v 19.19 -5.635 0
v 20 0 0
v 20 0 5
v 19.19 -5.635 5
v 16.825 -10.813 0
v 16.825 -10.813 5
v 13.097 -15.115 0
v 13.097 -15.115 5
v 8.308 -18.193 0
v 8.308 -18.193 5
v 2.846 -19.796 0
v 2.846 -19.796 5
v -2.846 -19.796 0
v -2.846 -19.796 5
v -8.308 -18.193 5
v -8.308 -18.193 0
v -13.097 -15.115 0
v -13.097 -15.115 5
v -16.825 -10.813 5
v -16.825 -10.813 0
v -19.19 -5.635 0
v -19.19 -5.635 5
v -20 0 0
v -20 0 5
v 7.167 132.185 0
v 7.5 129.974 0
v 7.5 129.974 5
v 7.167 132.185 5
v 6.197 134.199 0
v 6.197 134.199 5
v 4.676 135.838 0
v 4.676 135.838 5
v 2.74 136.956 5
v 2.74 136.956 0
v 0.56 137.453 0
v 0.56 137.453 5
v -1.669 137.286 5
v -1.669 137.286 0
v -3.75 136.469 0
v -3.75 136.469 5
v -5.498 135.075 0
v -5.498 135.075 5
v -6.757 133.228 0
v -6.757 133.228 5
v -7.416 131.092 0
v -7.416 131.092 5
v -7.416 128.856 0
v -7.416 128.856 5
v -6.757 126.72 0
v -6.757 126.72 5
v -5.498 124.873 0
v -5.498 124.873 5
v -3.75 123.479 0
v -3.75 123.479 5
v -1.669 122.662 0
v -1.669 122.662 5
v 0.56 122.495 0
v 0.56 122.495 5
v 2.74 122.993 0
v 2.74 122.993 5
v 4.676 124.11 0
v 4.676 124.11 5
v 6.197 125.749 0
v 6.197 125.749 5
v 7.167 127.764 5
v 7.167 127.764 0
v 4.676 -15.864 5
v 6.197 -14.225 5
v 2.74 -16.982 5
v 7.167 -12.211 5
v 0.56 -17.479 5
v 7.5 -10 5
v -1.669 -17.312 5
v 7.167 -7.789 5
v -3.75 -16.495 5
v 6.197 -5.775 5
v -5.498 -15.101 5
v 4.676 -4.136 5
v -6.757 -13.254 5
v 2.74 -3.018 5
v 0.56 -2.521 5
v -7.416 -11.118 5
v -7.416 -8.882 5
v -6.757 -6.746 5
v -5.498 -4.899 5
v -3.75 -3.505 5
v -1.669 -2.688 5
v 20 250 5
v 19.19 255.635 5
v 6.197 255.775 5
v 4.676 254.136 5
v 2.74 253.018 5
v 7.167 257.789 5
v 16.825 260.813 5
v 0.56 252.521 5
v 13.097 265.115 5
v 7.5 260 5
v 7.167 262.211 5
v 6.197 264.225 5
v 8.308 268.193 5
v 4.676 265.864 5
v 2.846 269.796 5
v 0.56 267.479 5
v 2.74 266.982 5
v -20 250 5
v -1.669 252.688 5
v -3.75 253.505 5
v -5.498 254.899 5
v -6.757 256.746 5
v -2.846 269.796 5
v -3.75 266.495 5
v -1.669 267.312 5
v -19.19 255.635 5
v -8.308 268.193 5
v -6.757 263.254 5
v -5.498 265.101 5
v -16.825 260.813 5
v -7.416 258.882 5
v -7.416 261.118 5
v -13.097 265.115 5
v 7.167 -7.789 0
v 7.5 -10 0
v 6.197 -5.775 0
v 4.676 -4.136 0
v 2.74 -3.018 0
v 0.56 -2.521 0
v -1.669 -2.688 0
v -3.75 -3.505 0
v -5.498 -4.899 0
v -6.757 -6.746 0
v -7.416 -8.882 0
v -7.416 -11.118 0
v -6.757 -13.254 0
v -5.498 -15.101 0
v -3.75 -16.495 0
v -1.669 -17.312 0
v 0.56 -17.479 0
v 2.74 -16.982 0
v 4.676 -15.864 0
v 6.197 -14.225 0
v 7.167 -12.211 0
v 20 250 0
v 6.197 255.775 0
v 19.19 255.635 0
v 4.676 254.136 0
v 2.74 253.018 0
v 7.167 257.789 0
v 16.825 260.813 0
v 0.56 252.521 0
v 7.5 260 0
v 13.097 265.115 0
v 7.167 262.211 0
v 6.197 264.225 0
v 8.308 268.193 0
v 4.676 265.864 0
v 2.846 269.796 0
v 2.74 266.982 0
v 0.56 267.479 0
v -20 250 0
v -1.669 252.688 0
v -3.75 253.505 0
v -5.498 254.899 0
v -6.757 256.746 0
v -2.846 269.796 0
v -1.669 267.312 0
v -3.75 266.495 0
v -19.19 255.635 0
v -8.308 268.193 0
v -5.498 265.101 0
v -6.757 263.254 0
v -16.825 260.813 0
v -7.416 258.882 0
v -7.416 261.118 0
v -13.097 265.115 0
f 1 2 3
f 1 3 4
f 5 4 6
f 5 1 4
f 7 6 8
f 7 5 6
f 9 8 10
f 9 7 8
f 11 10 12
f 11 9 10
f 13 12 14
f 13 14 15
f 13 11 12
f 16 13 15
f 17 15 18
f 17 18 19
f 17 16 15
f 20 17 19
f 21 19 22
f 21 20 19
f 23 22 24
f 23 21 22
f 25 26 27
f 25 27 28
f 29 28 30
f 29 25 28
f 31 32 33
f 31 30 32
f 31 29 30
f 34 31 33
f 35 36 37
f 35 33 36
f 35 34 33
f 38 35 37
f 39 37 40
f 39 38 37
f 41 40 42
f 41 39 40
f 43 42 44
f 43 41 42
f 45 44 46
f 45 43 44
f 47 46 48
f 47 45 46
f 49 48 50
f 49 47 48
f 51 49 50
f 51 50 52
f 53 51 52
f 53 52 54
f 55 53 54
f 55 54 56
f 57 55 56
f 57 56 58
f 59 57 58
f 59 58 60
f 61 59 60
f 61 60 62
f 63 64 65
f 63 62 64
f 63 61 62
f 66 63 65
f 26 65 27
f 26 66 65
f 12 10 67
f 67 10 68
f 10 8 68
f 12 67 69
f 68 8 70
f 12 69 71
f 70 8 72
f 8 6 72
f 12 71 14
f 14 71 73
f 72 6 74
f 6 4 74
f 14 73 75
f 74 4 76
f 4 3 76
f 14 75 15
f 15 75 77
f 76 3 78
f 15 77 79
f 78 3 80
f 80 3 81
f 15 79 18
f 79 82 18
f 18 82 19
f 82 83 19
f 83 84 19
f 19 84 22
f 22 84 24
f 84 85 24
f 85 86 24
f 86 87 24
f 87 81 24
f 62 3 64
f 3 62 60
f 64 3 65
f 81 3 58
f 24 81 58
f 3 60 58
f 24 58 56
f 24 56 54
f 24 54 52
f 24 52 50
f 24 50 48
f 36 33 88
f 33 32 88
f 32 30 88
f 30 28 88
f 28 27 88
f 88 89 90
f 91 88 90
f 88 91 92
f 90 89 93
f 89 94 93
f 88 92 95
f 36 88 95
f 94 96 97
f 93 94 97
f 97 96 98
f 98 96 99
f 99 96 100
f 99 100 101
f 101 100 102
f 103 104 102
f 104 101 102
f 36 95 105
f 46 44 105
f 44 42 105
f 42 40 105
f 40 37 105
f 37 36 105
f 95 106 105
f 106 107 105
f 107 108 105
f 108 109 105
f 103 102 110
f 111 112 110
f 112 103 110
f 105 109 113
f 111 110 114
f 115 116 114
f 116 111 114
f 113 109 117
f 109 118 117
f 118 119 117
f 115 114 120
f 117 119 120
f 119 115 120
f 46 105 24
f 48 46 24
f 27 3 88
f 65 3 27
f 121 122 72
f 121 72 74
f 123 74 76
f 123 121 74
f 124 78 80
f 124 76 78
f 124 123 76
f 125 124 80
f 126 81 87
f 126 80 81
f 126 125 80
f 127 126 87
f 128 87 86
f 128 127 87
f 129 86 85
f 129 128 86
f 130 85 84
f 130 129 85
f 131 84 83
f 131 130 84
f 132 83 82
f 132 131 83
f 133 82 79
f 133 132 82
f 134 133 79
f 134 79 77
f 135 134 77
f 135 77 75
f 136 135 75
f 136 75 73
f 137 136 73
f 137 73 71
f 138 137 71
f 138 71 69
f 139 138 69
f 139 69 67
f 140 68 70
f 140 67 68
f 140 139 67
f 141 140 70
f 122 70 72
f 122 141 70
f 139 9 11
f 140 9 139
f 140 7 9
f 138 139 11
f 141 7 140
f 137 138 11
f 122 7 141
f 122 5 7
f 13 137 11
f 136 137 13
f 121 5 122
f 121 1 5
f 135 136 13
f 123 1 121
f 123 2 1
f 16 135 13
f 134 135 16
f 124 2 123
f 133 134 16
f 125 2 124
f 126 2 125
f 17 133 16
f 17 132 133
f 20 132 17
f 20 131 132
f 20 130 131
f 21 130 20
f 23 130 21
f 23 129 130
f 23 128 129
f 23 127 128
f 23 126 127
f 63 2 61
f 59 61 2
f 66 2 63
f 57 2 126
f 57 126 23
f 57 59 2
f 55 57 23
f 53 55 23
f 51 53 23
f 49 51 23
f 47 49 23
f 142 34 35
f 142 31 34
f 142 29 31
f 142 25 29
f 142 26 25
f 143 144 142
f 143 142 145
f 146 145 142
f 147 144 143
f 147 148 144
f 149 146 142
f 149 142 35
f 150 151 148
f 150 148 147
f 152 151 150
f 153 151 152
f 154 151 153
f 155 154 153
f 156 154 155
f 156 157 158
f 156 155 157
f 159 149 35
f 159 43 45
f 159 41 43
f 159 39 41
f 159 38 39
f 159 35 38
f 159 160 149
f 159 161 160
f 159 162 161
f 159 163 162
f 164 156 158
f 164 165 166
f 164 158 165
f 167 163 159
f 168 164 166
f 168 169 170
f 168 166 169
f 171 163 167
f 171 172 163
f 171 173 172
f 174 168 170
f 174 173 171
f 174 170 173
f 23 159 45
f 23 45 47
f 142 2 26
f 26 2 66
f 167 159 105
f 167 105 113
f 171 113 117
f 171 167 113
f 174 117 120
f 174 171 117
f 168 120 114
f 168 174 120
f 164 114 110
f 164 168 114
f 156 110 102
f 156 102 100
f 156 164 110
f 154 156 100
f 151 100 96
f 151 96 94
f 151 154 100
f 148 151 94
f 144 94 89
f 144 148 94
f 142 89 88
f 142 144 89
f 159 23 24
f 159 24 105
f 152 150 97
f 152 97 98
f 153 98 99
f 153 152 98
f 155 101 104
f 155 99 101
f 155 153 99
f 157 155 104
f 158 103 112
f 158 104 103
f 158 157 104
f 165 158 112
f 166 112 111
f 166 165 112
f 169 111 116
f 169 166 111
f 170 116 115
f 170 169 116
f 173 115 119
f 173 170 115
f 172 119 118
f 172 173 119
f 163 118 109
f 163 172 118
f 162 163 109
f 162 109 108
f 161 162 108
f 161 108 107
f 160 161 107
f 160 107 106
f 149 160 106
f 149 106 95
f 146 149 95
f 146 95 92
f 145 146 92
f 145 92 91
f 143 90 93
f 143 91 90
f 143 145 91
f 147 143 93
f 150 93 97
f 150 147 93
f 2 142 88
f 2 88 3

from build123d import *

# Parameters (mm, degrees)
BOSS_EXTRUDE1_DEPTH     = 5
CUT_EXTRUDE4_DEPTH      = 271.785893281
CUT_EXTRUDE4_DEPTH_BACK = 271.785893281
SKETCH3_R               = 7.5
CUT_EXTRUDE5_DEPTH      = 271.785893281
CUT_EXTRUDE5_DEPTH_BACK = 271.785893281
SKETCH5_R               = 7.5


with BuildPart() as part:
    # Sketch1 → Boss-Extrude1 (new body)
    with BuildSketch(Plane.XY):
        with BuildLine():
            Line((-20, 0), (-20, 250))
            ThreePointArc((-20, 250), (0, 270), (20, 250))
            Line((20, 250), (20, 0))
            ThreePointArc((20, 0), (0, -20), (-20, 0))
        make_face()
    extrude(amount=BOSS_EXTRUDE1_DEPTH)

    # Sketch3 → Cut-Extrude4 (cut, two sides: drawn at the far end of the back side and taken through both)
    with BuildSketch(Plane.XY.offset(-CUT_EXTRUDE4_DEPTH_BACK)):
        with Locations((0, 260)):
            Circle(SKETCH3_R)
        with Locations((0, -10)):
            Circle(SKETCH3_R)
    extrude(amount=CUT_EXTRUDE4_DEPTH + CUT_EXTRUDE4_DEPTH_BACK, mode=Mode.SUBTRACT)

    # Sketch5 → Cut-Extrude5 (cut, two sides: drawn at the far end of the back side and taken through both)
    with BuildSketch(Plane.XY.offset(5).offset(-CUT_EXTRUDE5_DEPTH_BACK)):
        with Locations((0, 129.974184192)):
            Circle(SKETCH5_R)
    extrude(amount=CUT_EXTRUDE5_DEPTH + CUT_EXTRUDE5_DEPTH_BACK, mode=Mode.SUBTRACT)


solid = part.part
